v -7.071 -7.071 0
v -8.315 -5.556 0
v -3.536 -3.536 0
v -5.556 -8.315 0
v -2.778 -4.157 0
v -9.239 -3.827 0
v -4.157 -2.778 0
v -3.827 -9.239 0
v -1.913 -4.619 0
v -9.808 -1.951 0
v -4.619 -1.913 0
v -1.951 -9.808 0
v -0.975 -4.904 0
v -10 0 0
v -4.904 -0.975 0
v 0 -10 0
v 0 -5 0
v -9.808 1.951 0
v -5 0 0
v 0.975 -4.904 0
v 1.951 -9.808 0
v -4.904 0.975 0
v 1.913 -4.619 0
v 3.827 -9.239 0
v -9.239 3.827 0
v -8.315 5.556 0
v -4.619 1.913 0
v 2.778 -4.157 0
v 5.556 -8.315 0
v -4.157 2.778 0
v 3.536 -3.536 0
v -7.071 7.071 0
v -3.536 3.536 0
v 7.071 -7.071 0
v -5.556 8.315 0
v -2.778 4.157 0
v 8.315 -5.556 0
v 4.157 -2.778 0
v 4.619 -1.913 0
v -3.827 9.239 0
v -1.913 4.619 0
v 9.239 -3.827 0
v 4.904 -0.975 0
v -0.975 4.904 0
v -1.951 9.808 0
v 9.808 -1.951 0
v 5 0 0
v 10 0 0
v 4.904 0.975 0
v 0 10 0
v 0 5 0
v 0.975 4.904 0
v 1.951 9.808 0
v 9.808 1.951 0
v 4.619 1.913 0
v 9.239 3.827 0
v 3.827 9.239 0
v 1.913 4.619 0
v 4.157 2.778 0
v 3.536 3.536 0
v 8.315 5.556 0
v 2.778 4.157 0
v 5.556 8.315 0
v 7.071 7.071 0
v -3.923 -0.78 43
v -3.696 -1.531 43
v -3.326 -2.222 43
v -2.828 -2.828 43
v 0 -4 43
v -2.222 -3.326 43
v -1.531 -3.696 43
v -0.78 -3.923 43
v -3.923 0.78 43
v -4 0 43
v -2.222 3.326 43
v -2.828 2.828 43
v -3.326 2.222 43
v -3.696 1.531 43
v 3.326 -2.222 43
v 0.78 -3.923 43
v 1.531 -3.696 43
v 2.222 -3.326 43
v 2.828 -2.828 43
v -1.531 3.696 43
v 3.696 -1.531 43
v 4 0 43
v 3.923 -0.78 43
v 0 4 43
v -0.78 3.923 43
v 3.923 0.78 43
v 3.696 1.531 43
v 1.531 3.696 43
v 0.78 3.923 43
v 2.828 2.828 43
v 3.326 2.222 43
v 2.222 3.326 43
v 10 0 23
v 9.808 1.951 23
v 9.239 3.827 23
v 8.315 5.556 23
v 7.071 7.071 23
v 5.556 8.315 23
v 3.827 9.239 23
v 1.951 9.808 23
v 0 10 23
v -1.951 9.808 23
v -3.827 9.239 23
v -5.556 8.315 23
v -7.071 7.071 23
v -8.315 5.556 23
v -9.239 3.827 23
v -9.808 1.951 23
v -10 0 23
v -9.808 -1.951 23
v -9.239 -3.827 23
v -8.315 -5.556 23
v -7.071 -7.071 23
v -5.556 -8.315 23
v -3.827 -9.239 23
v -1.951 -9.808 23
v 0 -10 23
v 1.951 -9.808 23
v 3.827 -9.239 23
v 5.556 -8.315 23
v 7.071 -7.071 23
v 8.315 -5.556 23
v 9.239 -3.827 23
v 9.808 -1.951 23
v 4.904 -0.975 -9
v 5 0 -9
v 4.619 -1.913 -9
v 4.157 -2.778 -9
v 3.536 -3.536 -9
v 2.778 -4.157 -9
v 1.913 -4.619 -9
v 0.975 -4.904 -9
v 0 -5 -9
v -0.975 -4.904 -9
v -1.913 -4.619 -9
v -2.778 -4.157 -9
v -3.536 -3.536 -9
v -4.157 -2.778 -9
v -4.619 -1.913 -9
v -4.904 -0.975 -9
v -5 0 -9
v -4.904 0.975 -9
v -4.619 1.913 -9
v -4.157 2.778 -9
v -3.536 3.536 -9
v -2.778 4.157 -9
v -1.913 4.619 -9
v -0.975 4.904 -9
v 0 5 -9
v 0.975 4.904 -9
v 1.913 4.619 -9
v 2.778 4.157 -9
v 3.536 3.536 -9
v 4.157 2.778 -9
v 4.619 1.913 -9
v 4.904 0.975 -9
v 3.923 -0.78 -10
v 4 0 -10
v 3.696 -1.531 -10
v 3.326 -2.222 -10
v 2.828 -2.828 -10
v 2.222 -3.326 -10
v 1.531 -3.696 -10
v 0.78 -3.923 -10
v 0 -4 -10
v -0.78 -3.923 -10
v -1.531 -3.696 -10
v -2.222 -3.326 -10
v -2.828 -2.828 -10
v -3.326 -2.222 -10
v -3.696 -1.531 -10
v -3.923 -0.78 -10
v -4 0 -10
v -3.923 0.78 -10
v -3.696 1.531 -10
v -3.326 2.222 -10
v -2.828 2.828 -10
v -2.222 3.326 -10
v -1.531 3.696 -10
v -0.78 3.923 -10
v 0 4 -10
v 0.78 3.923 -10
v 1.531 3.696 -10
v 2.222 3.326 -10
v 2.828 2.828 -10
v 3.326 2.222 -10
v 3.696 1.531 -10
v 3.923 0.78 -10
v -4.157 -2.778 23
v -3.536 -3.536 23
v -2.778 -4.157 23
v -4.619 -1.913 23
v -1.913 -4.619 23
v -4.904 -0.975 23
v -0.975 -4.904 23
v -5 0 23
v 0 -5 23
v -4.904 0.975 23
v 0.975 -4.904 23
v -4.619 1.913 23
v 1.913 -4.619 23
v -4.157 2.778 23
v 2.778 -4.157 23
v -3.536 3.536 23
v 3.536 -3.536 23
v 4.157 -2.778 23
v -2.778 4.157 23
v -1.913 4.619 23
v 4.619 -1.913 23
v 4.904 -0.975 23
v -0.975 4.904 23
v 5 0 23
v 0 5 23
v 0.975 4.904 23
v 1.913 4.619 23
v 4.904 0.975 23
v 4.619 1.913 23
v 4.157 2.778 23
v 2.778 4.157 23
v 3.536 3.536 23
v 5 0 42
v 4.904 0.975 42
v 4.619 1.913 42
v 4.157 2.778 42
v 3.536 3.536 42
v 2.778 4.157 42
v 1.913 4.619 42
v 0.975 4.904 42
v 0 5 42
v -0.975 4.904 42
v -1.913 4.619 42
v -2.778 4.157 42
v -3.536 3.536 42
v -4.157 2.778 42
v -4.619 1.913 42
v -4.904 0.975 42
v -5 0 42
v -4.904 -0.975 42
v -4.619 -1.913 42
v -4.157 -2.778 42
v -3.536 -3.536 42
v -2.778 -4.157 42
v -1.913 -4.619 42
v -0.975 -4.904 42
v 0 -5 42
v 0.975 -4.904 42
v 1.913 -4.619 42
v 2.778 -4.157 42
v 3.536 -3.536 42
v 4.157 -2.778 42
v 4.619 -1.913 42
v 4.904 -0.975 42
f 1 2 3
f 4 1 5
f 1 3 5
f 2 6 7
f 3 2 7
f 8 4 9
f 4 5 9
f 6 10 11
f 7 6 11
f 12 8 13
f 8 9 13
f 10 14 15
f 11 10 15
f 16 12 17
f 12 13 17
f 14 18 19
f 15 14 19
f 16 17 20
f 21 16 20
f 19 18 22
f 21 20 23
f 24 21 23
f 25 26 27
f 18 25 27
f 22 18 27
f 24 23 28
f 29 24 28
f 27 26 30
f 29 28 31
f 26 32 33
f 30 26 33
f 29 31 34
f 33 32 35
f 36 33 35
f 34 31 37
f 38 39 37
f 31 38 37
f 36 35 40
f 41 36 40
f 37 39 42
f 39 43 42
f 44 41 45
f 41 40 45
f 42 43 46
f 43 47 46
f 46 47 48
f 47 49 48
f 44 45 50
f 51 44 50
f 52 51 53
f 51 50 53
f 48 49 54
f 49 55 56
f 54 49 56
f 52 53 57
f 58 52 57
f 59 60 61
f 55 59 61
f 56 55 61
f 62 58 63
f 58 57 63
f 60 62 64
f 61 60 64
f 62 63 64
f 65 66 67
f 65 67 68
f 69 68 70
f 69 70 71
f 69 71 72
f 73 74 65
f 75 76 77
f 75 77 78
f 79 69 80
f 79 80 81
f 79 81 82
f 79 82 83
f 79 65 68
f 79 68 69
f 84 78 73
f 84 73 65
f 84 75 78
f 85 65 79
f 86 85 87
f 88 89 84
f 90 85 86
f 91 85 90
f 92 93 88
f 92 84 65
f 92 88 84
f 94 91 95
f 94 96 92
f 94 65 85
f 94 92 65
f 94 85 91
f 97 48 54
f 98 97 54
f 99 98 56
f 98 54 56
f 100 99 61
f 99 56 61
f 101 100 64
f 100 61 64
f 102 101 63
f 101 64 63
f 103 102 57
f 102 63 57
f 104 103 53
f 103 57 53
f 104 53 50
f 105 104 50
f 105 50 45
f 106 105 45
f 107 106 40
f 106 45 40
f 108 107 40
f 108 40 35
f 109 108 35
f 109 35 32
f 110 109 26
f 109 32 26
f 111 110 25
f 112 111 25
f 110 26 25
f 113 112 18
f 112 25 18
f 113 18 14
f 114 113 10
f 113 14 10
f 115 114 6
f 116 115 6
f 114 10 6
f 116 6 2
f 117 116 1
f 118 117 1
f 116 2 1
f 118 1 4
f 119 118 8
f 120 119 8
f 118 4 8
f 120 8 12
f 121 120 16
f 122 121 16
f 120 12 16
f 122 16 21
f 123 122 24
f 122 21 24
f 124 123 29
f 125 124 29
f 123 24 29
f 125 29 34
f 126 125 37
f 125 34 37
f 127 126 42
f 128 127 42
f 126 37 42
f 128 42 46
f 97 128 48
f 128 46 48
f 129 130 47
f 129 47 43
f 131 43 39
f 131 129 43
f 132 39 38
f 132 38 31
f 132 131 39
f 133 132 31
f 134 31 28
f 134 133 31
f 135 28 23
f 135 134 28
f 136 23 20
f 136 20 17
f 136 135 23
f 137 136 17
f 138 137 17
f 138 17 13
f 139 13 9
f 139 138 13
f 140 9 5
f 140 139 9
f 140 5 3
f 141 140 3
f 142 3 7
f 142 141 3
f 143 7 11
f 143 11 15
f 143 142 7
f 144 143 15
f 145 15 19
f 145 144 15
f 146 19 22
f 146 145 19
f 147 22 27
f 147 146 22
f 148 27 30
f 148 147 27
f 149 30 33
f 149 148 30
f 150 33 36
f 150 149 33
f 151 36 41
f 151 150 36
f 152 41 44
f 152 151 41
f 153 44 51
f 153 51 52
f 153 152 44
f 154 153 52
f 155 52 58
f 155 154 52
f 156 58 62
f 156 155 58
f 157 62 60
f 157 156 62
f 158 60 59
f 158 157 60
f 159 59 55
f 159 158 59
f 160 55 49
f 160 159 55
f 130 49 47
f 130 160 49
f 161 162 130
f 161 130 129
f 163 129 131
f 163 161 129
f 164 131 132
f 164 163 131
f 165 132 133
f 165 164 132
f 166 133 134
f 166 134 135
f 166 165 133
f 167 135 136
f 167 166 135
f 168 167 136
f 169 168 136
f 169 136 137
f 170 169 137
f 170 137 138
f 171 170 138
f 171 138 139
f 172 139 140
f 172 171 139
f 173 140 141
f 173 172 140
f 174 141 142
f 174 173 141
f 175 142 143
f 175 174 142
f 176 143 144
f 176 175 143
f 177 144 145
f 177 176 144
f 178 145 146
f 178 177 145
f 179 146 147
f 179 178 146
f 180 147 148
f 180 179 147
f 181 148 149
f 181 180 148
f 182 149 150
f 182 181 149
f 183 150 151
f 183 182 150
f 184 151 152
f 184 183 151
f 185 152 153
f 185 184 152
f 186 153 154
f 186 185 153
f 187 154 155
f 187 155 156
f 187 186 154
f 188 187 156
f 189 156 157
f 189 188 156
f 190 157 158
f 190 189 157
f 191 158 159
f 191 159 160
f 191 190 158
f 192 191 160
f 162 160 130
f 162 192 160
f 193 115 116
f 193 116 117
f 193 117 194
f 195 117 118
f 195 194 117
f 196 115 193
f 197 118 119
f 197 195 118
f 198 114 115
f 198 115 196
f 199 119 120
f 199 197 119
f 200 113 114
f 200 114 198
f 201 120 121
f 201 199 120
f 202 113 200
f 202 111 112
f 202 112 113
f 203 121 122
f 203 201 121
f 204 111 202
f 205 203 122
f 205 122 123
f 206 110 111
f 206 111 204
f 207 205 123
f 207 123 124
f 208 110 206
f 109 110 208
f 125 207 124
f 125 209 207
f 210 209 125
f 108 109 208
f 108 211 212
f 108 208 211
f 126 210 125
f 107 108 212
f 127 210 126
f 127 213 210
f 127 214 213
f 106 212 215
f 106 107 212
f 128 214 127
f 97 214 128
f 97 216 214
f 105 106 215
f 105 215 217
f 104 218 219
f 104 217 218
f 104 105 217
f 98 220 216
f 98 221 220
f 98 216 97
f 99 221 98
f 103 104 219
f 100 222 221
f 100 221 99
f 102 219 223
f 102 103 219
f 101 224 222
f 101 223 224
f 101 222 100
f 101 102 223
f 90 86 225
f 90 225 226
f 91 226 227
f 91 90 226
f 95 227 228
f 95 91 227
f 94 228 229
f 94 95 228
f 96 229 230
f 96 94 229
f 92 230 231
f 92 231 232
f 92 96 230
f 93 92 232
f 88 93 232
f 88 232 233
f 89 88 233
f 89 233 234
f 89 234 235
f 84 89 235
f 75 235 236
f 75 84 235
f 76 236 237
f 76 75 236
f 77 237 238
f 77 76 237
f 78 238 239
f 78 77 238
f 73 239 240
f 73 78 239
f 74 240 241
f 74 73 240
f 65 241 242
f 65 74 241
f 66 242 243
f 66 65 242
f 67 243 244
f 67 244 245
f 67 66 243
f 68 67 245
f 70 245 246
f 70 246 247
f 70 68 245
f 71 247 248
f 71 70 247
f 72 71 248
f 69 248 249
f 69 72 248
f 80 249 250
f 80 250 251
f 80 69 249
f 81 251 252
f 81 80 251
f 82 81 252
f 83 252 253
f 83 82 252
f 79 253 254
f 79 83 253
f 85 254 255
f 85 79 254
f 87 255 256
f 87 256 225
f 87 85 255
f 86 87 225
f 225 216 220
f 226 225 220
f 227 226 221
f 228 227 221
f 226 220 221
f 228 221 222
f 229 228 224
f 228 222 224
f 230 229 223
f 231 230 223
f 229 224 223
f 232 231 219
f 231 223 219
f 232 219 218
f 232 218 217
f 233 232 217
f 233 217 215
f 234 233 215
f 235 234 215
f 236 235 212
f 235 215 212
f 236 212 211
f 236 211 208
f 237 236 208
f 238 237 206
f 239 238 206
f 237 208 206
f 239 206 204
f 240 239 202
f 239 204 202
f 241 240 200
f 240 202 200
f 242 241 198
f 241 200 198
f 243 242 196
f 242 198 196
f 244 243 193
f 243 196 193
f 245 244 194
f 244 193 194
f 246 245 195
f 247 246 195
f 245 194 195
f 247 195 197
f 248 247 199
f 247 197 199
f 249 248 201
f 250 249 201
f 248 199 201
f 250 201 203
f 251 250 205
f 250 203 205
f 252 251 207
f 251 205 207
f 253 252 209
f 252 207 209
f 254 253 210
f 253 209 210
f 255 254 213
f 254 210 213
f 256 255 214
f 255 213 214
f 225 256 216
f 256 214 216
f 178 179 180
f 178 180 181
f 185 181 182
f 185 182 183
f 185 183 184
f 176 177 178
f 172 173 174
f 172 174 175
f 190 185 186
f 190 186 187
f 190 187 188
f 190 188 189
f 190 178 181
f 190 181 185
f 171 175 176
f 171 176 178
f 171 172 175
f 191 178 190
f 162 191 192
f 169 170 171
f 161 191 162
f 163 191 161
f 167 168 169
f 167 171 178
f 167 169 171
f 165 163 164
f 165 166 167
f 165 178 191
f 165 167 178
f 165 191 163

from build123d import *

# Parameters (mm, degrees)
SKETCH2_R           = 10
BOSS_EXTRUDE1_DEPTH = 23
SKETCH3_R           = 5
BOSS_EXTRUDE2_DEPTH = 20
BOSS_EXTRUDE3_START = 10
SKETCH4_R           = 5
BOSS_EXTRUDE3_DEPTH = 10
CHAMFER1_SIZE       = 1
CHAMFER2_SIZE       = 1


with BuildPart() as part:
    # Sketch2 → Boss-Extrude1 (new body)
    with BuildSketch(Plane.XY):
        Circle(SKETCH2_R)
    extrude(amount=BOSS_EXTRUDE1_DEPTH)

    # Sketch3 → Boss-Extrude2 (add)
    with BuildSketch(Plane.XY.offset(23)):
        Circle(SKETCH3_R)
    extrude(amount=BOSS_EXTRUDE2_DEPTH)

    # Sketch4 → Boss-Extrude3 (add)
    with BuildSketch(Plane(origin=(0, 0, 0), x_dir=(-1, 0, 0), z_dir=(0, 0, -1)).offset(BOSS_EXTRUDE3_START)):
        with Locations(Location((0, 0, 0), (0, 0, 180))):
            Circle(SKETCH4_R)
    extrude(amount=-BOSS_EXTRUDE3_DEPTH)

    # Chamfer1
    chamfer1_edges = [part.edges().sort_by_distance(p)[0] for p in [
        (-5, 0, -10),
    ]]
    chamfer(chamfer1_edges, length=CHAMFER1_SIZE)

    # Chamfer2
    chamfer2_edges = [part.edges().sort_by_distance(p)[0] for p in [
        (-5, 0, 43),
    ]]
    chamfer(chamfer2_edges, length=CHAMFER2_SIZE)


solid = part.part
